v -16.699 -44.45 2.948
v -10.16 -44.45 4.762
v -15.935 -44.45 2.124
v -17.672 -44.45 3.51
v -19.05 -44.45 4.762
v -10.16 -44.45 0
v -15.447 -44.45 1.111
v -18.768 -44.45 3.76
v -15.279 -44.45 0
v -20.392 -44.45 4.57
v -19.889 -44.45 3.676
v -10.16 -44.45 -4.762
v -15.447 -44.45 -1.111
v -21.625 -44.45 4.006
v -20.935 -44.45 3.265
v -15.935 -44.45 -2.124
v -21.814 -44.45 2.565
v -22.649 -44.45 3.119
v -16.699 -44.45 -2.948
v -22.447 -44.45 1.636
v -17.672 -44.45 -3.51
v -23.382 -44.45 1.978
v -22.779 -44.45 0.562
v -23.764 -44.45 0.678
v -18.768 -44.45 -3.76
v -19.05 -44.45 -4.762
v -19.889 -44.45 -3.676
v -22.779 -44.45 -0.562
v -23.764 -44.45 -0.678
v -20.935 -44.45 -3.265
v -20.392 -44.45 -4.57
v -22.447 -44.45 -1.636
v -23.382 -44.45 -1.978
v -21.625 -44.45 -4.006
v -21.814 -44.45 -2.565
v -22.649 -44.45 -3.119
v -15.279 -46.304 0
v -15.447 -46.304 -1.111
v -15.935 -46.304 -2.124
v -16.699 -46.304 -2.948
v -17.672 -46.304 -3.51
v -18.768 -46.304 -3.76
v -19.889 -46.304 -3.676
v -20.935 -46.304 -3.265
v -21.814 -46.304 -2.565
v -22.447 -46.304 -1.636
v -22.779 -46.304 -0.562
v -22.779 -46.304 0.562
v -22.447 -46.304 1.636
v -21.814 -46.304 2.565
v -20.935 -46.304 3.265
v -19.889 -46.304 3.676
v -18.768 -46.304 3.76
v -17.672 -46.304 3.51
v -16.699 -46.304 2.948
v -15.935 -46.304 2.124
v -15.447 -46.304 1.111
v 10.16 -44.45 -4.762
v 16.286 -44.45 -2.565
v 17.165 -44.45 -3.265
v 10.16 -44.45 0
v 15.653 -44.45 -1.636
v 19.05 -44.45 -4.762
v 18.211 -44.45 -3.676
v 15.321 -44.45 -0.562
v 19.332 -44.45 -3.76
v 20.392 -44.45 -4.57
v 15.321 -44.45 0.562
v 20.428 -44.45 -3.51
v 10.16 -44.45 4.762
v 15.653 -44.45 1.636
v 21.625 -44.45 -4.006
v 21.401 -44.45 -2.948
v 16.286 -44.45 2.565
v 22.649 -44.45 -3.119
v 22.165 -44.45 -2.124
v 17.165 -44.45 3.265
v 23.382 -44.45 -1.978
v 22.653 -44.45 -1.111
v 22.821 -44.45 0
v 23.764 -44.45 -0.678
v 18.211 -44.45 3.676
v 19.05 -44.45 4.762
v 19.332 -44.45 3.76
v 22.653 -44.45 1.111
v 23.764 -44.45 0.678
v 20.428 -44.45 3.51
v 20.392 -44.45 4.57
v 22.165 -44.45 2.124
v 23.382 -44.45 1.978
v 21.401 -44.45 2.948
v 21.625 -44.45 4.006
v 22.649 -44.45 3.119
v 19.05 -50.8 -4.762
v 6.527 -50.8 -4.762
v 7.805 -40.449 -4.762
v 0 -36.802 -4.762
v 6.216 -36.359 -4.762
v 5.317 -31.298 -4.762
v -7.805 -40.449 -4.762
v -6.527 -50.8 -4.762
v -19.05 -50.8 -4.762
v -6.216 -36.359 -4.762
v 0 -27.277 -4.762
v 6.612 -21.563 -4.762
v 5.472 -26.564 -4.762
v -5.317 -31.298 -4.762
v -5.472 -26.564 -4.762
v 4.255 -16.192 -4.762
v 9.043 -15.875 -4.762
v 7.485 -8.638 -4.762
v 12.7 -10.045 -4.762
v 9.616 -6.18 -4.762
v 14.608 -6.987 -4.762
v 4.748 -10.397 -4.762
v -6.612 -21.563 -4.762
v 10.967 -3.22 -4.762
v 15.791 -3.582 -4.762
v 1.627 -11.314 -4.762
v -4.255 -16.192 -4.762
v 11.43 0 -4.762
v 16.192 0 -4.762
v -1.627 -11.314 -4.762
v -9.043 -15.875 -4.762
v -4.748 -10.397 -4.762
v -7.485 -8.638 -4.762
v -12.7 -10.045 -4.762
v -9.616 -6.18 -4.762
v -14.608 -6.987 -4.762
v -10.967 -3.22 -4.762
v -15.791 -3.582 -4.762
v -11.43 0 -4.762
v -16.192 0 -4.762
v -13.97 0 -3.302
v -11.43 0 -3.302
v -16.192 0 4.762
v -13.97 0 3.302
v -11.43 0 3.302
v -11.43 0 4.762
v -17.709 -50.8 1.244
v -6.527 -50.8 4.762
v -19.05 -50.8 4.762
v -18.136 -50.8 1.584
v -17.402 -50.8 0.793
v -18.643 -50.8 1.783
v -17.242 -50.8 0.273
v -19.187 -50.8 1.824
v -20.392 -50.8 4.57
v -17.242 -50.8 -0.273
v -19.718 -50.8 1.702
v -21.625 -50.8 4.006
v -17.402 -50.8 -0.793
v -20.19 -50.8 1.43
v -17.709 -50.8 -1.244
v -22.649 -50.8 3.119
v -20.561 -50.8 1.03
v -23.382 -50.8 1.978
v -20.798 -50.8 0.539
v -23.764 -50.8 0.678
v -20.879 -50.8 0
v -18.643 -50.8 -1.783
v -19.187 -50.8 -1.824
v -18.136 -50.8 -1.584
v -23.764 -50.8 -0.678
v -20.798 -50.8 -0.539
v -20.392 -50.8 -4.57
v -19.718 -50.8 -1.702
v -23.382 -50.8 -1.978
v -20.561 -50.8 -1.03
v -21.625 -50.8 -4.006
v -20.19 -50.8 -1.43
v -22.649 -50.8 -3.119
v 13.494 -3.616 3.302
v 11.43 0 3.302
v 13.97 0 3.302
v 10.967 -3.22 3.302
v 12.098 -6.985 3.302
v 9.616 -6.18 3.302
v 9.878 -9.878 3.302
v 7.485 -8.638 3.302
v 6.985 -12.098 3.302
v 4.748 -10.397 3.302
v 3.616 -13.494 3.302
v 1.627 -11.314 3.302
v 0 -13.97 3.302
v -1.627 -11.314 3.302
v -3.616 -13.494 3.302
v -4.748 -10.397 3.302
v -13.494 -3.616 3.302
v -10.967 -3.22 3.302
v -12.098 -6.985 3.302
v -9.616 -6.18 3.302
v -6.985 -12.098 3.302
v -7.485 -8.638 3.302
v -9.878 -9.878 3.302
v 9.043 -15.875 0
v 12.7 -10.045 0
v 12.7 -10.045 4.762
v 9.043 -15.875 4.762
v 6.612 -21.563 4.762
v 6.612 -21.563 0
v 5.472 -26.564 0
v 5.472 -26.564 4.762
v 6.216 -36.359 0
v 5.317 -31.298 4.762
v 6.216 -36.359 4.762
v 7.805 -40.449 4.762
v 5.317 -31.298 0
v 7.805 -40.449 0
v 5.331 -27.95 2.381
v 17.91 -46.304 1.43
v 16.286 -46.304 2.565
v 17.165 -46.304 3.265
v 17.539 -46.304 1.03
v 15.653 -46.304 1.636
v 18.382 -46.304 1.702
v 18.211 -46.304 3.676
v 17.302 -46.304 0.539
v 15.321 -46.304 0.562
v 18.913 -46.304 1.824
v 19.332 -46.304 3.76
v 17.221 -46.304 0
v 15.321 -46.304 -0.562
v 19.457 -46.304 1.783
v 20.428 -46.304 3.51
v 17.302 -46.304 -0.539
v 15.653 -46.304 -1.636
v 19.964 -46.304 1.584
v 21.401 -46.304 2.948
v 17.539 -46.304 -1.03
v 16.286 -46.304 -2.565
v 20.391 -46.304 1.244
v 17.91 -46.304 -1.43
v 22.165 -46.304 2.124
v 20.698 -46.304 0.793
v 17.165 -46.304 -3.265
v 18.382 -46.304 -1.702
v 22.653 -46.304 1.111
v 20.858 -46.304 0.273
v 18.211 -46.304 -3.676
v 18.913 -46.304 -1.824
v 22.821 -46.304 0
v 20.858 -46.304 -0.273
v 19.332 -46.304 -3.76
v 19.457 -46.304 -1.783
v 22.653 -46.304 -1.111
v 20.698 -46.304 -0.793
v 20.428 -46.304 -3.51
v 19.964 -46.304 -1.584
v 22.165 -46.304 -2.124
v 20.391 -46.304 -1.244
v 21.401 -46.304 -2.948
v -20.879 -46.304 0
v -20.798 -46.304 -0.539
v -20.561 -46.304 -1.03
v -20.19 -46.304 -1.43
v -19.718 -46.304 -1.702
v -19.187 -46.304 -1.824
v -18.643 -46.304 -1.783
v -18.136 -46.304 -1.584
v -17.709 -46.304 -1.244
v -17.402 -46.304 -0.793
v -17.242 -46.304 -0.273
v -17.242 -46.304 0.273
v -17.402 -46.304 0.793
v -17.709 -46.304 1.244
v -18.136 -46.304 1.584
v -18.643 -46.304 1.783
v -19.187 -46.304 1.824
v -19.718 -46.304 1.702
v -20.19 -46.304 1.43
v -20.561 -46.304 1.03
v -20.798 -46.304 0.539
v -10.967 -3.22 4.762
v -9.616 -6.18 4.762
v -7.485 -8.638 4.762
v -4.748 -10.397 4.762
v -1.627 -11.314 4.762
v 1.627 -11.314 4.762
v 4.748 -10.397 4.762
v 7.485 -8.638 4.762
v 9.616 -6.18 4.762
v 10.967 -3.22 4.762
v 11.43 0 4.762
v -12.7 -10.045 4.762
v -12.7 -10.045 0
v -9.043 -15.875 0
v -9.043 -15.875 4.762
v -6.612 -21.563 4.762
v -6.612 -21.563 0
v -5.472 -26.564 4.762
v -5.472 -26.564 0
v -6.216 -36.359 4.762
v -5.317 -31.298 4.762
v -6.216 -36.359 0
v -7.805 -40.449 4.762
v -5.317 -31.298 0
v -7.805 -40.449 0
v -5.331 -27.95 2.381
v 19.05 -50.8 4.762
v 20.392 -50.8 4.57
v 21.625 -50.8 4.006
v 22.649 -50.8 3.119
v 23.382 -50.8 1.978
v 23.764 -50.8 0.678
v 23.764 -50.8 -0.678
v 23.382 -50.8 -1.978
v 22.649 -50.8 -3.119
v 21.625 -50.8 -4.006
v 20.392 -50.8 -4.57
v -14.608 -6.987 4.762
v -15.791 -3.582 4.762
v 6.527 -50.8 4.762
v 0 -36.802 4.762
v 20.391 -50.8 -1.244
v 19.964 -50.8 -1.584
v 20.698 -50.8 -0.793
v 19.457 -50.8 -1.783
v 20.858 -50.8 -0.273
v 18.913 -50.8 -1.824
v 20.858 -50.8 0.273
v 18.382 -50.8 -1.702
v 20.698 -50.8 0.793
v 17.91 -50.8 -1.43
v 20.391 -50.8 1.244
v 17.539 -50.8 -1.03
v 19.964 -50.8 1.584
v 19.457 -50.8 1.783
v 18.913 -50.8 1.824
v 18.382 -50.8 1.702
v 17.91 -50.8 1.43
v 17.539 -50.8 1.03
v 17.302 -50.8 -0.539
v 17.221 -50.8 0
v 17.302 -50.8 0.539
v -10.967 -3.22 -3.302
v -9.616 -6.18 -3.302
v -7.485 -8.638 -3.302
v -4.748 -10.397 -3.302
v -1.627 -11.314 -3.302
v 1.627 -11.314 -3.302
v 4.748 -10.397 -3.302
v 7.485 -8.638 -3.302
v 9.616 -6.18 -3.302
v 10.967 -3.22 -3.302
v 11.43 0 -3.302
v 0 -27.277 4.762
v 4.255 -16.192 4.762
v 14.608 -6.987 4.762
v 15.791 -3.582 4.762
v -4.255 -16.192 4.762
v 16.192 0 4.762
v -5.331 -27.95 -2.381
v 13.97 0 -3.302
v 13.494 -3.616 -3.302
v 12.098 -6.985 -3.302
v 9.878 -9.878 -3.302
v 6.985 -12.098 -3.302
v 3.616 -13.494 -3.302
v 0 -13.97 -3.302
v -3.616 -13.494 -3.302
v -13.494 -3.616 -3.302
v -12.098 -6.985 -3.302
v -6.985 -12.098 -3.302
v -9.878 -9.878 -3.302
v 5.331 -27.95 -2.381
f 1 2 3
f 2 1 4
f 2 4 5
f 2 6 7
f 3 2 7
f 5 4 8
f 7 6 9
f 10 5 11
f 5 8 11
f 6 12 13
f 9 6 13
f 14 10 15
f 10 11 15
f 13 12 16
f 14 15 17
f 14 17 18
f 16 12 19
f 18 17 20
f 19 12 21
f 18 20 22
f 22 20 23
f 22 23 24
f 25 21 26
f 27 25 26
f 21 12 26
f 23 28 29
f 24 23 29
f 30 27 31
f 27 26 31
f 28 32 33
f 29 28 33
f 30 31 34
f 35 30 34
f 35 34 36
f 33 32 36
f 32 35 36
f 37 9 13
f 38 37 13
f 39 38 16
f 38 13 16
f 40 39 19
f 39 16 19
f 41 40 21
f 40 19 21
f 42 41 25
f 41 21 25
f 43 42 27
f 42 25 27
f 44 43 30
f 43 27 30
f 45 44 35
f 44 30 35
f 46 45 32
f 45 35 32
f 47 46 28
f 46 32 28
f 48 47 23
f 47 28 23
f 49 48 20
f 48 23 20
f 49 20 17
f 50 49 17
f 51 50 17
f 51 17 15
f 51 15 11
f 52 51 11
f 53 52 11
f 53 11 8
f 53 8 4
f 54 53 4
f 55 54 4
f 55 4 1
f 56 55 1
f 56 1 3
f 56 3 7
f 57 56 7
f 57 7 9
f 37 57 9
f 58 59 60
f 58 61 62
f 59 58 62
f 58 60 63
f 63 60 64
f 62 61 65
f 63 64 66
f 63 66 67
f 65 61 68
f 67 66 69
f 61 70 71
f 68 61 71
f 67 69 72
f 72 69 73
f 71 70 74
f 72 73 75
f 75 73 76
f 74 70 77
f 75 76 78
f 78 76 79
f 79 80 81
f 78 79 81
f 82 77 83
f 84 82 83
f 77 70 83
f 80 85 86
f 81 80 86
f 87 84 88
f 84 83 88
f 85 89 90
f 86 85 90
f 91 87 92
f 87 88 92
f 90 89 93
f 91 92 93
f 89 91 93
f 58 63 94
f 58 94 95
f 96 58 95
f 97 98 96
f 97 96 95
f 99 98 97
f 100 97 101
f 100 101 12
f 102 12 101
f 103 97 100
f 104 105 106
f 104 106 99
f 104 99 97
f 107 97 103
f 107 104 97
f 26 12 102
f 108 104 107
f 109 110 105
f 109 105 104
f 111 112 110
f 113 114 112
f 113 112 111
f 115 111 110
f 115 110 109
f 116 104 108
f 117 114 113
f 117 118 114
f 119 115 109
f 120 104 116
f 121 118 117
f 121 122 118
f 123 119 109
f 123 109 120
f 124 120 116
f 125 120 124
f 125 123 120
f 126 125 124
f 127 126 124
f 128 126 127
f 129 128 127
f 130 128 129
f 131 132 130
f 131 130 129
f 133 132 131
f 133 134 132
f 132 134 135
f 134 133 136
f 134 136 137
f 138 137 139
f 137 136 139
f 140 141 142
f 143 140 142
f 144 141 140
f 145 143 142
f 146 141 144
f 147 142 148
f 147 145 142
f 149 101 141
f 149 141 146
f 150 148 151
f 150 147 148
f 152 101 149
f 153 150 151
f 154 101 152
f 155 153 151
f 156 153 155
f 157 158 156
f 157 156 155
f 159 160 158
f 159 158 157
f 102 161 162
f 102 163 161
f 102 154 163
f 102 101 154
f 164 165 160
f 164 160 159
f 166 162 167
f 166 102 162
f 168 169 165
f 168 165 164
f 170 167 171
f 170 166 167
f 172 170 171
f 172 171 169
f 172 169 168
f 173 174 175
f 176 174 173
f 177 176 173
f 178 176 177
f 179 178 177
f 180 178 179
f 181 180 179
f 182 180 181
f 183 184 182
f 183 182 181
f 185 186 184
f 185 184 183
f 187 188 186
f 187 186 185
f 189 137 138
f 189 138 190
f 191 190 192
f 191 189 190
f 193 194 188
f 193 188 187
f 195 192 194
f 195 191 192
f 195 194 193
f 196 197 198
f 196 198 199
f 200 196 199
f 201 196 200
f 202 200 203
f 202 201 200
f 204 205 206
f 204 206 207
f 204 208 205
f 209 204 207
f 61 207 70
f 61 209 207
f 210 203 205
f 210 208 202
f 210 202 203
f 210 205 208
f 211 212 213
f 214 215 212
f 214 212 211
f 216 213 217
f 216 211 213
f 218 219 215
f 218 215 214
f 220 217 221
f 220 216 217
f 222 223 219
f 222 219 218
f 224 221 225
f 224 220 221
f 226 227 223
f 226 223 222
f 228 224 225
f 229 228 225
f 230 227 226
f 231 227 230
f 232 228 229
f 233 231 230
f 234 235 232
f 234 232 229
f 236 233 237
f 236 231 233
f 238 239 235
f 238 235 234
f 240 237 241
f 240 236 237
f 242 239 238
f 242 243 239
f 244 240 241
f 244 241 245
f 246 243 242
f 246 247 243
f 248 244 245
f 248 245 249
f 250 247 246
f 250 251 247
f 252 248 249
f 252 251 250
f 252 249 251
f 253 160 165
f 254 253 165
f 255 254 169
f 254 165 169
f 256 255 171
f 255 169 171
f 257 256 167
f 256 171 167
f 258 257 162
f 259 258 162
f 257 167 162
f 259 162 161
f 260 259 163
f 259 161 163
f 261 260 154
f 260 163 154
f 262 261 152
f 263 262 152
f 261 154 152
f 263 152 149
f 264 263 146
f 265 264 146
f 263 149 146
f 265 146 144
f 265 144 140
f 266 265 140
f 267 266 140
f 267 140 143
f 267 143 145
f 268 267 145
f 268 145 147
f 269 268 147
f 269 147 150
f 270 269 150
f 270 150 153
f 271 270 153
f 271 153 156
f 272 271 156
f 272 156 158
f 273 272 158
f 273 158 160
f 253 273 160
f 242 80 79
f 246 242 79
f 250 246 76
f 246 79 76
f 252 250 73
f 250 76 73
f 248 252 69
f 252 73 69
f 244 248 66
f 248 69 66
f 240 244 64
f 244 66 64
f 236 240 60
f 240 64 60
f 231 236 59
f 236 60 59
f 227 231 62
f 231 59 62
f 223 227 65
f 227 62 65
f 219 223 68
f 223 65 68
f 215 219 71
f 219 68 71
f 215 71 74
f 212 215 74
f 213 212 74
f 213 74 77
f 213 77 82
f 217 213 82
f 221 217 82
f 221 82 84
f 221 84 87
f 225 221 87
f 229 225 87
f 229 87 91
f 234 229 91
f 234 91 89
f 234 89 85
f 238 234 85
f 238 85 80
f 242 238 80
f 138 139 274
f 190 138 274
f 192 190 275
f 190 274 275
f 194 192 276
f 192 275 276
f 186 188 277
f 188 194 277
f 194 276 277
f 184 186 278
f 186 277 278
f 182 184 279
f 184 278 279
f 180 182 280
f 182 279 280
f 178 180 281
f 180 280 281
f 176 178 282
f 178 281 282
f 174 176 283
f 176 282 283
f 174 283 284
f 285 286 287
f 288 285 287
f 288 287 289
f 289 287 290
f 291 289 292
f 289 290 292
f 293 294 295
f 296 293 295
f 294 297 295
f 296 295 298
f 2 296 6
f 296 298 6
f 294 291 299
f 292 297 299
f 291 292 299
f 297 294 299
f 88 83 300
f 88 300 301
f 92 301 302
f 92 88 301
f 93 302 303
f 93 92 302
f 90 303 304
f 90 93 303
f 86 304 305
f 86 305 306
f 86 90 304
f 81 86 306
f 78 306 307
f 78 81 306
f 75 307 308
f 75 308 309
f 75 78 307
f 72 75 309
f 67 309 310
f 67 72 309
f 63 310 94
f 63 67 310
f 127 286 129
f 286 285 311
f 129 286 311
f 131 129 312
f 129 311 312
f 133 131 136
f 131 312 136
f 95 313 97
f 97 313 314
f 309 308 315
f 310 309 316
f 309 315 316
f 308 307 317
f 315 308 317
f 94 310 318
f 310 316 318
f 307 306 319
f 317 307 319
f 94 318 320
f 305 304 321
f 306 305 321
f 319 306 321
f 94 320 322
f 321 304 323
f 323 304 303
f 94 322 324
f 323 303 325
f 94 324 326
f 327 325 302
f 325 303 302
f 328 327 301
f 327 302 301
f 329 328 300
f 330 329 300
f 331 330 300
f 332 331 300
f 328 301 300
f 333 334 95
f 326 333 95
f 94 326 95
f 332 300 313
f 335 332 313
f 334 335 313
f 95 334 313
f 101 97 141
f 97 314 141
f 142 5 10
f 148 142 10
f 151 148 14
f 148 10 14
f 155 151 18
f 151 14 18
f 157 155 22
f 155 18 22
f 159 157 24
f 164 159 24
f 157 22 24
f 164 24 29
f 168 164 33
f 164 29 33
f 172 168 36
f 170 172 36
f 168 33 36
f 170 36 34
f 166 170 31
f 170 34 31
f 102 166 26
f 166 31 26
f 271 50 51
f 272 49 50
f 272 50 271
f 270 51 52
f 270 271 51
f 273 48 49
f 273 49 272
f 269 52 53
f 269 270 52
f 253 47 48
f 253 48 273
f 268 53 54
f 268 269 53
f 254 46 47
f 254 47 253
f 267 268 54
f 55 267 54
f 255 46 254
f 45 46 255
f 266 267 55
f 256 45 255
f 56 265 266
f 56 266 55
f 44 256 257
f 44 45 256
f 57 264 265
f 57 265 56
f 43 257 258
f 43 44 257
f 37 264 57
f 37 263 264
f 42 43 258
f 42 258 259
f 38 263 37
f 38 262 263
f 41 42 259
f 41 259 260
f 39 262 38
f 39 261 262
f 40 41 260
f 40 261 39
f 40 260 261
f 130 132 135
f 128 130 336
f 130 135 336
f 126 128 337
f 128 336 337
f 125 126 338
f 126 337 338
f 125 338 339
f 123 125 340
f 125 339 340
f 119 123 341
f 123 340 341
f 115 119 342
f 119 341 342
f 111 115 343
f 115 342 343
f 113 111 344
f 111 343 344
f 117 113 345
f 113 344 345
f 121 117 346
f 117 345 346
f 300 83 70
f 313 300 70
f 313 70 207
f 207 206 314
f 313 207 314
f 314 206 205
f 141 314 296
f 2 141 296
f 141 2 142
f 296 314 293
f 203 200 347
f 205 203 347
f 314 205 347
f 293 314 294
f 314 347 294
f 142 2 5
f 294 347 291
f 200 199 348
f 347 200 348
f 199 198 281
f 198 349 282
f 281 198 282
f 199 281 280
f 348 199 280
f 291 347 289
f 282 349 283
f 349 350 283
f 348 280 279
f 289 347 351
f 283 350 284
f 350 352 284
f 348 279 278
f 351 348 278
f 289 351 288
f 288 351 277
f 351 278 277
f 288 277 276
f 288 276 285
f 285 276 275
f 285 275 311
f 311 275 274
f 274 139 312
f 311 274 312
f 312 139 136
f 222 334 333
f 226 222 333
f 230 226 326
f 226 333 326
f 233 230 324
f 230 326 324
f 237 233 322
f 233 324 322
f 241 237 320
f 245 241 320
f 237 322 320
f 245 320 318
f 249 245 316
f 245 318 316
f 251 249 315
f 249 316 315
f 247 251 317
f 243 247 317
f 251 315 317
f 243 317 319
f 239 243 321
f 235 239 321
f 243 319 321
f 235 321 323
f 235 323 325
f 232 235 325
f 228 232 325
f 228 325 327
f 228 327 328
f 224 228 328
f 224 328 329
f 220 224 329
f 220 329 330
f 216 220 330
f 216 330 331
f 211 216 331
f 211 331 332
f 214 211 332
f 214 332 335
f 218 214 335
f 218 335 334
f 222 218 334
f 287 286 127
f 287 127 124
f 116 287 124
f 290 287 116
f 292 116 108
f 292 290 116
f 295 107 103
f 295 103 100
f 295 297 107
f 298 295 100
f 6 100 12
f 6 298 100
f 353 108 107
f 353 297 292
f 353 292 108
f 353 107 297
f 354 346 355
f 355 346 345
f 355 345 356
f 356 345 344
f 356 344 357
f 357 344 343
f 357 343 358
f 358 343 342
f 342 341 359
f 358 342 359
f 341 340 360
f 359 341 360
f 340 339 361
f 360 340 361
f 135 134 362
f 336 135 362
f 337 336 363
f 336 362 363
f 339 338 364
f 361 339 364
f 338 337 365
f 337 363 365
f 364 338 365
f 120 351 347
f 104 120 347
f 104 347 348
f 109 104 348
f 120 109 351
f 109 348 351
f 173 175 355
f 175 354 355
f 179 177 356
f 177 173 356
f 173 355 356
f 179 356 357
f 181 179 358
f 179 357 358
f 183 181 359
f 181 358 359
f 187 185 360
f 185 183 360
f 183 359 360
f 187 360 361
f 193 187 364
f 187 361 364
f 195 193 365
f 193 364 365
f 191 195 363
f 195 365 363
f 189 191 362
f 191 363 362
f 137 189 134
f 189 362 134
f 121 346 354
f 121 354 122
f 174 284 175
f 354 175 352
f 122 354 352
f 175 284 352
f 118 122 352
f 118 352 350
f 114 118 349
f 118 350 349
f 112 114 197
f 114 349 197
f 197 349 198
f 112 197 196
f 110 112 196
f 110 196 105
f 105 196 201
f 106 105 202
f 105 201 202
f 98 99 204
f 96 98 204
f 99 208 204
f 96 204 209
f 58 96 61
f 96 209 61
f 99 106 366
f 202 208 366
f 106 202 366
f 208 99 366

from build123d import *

# Parameters (mm, degrees)
BOSS_EXTRUDE1_DEPTH                            = 4.7625
SKETCH4_W                                      = 6.604
SKETCH4_H                                      = 2.54
BOSS_EXTRUDE2_DEPTH                            = 6.35
CBORE_FOR_6_BUTTON_HEAD_CAP_SCREW1_D           = 3.6576
CBORE_FOR_6_BUTTON_HEAD_CAP_SCREW1_DEPTH       = 6.35
CBORE_FOR_6_BUTTON_HEAD_CAP_SCREW1_CBORE_D     = 7.54126
CBORE_FOR_6_BUTTON_HEAD_CAP_SCREW1_CBORE_DEPTH = 1.8542


with BuildPart() as part:
    # Sketch1 → Boss-Extrude1 (new, symmetric)
    with BuildSketch(Plane.XY):
        with BuildLine():
            Line((6.52733268, -50.8), (0, -36.802089895))
            Line((0, -36.802089895), (-6.52733268, -50.8))
            Line((-6.52733268, -50.8), (-19.05, -50.8))
            Line((-19.05, -50.8), (-19.05, -44.45))
            Line((-19.05, -44.45), (-10.16, -44.45))
            add(Edge.make_bspline(
                [(-12.7, -10.045250432), (0.767706839, -28.651479816), (-10.16, -44.45)],
                knots=[0, 0, 0, 1, 1, 1], degree=2))
            ThreePointArc((-12.7, -10.045250432), (-15.29447296, -5.317532616), (-16.1925, 0))
            Line((-16.1925, 0), (-11.43, 0))
            ThreePointArc((-11.43, 0), (0, -11.43), (11.43, 0))
            Line((11.43, 0), (16.1925, 0))
            ThreePointArc((16.1925, 0), (15.29447296, -5.317532616), (12.7, -10.045250432))
            add(Edge.make_bspline(
                [(12.7, -10.045250432), (-0.767706839, -28.651479816), (10.16, -44.45)],
                knots=[0, 0, 0, 1, 1, 1], degree=2))
            Line((10.16, -44.45), (19.05, -44.45))
            Line((19.05, -44.45), (19.05, -50.8))
            Line((19.05, -50.8), (6.52733268, -50.8))
        make_face()
        Polygon((4.254975404, -16.1925), (-4.254975404, -16.1925), (0, -27.277089895), align=None, mode=Mode.SUBTRACT)
    extrude(amount=BOSS_EXTRUDE1_DEPTH, both=True)

    # Sketch4 → Cut-Revolve1 (revolve, cut)
    with BuildSketch(Plane(origin=(0, 0, 0), x_dir=(0, 0, -1), z_dir=(1, 0, 0))):
        with Locations((0, -12.7)):
            Rectangle(SKETCH4_W, SKETCH4_H)
    revolve(axis=Axis((0, 0, 0), (0, 0, -1)), mode=Mode.SUBTRACT)

    # Sketch8 → Boss-Extrude2 (add)
    with BuildSketch(Plane(origin=(0, -44.45, 0), x_dir=(1, 0, 0), z_dir=(0, 1, 0))):
        with BuildLine():
            Line((-19.05, 4.7625), (-19.05, -4.7625))
            ThreePointArc((-19.05, -4.7625), (-23.8125, 0), (-19.05, 4.7625))
        make_face()
        with BuildLine():
            Line((19.05, 4.7625), (19.05, -4.7625))
            ThreePointArc((19.05, -4.7625), (23.8125, 0), (19.05, 4.7625))
        make_face()
    extrude(amount=-BOSS_EXTRUDE2_DEPTH)

    # CBORE for #6 Button Head Cap Screw1
    with Locations(Plane(origin=(0, -44.45, 0), x_dir=(1, 0, 0), z_dir=(0, 1, 0))):
        with Locations((-19.05, 0), (19.05, 0)):
            CounterBoreHole(CBORE_FOR_6_BUTTON_HEAD_CAP_SCREW1_D / 2, CBORE_FOR_6_BUTTON_HEAD_CAP_SCREW1_CBORE_D / 2, CBORE_FOR_6_BUTTON_HEAD_CAP_SCREW1_CBORE_DEPTH, depth=CBORE_FOR_6_BUTTON_HEAD_CAP_SCREW1_DEPTH)


solid = part.part
